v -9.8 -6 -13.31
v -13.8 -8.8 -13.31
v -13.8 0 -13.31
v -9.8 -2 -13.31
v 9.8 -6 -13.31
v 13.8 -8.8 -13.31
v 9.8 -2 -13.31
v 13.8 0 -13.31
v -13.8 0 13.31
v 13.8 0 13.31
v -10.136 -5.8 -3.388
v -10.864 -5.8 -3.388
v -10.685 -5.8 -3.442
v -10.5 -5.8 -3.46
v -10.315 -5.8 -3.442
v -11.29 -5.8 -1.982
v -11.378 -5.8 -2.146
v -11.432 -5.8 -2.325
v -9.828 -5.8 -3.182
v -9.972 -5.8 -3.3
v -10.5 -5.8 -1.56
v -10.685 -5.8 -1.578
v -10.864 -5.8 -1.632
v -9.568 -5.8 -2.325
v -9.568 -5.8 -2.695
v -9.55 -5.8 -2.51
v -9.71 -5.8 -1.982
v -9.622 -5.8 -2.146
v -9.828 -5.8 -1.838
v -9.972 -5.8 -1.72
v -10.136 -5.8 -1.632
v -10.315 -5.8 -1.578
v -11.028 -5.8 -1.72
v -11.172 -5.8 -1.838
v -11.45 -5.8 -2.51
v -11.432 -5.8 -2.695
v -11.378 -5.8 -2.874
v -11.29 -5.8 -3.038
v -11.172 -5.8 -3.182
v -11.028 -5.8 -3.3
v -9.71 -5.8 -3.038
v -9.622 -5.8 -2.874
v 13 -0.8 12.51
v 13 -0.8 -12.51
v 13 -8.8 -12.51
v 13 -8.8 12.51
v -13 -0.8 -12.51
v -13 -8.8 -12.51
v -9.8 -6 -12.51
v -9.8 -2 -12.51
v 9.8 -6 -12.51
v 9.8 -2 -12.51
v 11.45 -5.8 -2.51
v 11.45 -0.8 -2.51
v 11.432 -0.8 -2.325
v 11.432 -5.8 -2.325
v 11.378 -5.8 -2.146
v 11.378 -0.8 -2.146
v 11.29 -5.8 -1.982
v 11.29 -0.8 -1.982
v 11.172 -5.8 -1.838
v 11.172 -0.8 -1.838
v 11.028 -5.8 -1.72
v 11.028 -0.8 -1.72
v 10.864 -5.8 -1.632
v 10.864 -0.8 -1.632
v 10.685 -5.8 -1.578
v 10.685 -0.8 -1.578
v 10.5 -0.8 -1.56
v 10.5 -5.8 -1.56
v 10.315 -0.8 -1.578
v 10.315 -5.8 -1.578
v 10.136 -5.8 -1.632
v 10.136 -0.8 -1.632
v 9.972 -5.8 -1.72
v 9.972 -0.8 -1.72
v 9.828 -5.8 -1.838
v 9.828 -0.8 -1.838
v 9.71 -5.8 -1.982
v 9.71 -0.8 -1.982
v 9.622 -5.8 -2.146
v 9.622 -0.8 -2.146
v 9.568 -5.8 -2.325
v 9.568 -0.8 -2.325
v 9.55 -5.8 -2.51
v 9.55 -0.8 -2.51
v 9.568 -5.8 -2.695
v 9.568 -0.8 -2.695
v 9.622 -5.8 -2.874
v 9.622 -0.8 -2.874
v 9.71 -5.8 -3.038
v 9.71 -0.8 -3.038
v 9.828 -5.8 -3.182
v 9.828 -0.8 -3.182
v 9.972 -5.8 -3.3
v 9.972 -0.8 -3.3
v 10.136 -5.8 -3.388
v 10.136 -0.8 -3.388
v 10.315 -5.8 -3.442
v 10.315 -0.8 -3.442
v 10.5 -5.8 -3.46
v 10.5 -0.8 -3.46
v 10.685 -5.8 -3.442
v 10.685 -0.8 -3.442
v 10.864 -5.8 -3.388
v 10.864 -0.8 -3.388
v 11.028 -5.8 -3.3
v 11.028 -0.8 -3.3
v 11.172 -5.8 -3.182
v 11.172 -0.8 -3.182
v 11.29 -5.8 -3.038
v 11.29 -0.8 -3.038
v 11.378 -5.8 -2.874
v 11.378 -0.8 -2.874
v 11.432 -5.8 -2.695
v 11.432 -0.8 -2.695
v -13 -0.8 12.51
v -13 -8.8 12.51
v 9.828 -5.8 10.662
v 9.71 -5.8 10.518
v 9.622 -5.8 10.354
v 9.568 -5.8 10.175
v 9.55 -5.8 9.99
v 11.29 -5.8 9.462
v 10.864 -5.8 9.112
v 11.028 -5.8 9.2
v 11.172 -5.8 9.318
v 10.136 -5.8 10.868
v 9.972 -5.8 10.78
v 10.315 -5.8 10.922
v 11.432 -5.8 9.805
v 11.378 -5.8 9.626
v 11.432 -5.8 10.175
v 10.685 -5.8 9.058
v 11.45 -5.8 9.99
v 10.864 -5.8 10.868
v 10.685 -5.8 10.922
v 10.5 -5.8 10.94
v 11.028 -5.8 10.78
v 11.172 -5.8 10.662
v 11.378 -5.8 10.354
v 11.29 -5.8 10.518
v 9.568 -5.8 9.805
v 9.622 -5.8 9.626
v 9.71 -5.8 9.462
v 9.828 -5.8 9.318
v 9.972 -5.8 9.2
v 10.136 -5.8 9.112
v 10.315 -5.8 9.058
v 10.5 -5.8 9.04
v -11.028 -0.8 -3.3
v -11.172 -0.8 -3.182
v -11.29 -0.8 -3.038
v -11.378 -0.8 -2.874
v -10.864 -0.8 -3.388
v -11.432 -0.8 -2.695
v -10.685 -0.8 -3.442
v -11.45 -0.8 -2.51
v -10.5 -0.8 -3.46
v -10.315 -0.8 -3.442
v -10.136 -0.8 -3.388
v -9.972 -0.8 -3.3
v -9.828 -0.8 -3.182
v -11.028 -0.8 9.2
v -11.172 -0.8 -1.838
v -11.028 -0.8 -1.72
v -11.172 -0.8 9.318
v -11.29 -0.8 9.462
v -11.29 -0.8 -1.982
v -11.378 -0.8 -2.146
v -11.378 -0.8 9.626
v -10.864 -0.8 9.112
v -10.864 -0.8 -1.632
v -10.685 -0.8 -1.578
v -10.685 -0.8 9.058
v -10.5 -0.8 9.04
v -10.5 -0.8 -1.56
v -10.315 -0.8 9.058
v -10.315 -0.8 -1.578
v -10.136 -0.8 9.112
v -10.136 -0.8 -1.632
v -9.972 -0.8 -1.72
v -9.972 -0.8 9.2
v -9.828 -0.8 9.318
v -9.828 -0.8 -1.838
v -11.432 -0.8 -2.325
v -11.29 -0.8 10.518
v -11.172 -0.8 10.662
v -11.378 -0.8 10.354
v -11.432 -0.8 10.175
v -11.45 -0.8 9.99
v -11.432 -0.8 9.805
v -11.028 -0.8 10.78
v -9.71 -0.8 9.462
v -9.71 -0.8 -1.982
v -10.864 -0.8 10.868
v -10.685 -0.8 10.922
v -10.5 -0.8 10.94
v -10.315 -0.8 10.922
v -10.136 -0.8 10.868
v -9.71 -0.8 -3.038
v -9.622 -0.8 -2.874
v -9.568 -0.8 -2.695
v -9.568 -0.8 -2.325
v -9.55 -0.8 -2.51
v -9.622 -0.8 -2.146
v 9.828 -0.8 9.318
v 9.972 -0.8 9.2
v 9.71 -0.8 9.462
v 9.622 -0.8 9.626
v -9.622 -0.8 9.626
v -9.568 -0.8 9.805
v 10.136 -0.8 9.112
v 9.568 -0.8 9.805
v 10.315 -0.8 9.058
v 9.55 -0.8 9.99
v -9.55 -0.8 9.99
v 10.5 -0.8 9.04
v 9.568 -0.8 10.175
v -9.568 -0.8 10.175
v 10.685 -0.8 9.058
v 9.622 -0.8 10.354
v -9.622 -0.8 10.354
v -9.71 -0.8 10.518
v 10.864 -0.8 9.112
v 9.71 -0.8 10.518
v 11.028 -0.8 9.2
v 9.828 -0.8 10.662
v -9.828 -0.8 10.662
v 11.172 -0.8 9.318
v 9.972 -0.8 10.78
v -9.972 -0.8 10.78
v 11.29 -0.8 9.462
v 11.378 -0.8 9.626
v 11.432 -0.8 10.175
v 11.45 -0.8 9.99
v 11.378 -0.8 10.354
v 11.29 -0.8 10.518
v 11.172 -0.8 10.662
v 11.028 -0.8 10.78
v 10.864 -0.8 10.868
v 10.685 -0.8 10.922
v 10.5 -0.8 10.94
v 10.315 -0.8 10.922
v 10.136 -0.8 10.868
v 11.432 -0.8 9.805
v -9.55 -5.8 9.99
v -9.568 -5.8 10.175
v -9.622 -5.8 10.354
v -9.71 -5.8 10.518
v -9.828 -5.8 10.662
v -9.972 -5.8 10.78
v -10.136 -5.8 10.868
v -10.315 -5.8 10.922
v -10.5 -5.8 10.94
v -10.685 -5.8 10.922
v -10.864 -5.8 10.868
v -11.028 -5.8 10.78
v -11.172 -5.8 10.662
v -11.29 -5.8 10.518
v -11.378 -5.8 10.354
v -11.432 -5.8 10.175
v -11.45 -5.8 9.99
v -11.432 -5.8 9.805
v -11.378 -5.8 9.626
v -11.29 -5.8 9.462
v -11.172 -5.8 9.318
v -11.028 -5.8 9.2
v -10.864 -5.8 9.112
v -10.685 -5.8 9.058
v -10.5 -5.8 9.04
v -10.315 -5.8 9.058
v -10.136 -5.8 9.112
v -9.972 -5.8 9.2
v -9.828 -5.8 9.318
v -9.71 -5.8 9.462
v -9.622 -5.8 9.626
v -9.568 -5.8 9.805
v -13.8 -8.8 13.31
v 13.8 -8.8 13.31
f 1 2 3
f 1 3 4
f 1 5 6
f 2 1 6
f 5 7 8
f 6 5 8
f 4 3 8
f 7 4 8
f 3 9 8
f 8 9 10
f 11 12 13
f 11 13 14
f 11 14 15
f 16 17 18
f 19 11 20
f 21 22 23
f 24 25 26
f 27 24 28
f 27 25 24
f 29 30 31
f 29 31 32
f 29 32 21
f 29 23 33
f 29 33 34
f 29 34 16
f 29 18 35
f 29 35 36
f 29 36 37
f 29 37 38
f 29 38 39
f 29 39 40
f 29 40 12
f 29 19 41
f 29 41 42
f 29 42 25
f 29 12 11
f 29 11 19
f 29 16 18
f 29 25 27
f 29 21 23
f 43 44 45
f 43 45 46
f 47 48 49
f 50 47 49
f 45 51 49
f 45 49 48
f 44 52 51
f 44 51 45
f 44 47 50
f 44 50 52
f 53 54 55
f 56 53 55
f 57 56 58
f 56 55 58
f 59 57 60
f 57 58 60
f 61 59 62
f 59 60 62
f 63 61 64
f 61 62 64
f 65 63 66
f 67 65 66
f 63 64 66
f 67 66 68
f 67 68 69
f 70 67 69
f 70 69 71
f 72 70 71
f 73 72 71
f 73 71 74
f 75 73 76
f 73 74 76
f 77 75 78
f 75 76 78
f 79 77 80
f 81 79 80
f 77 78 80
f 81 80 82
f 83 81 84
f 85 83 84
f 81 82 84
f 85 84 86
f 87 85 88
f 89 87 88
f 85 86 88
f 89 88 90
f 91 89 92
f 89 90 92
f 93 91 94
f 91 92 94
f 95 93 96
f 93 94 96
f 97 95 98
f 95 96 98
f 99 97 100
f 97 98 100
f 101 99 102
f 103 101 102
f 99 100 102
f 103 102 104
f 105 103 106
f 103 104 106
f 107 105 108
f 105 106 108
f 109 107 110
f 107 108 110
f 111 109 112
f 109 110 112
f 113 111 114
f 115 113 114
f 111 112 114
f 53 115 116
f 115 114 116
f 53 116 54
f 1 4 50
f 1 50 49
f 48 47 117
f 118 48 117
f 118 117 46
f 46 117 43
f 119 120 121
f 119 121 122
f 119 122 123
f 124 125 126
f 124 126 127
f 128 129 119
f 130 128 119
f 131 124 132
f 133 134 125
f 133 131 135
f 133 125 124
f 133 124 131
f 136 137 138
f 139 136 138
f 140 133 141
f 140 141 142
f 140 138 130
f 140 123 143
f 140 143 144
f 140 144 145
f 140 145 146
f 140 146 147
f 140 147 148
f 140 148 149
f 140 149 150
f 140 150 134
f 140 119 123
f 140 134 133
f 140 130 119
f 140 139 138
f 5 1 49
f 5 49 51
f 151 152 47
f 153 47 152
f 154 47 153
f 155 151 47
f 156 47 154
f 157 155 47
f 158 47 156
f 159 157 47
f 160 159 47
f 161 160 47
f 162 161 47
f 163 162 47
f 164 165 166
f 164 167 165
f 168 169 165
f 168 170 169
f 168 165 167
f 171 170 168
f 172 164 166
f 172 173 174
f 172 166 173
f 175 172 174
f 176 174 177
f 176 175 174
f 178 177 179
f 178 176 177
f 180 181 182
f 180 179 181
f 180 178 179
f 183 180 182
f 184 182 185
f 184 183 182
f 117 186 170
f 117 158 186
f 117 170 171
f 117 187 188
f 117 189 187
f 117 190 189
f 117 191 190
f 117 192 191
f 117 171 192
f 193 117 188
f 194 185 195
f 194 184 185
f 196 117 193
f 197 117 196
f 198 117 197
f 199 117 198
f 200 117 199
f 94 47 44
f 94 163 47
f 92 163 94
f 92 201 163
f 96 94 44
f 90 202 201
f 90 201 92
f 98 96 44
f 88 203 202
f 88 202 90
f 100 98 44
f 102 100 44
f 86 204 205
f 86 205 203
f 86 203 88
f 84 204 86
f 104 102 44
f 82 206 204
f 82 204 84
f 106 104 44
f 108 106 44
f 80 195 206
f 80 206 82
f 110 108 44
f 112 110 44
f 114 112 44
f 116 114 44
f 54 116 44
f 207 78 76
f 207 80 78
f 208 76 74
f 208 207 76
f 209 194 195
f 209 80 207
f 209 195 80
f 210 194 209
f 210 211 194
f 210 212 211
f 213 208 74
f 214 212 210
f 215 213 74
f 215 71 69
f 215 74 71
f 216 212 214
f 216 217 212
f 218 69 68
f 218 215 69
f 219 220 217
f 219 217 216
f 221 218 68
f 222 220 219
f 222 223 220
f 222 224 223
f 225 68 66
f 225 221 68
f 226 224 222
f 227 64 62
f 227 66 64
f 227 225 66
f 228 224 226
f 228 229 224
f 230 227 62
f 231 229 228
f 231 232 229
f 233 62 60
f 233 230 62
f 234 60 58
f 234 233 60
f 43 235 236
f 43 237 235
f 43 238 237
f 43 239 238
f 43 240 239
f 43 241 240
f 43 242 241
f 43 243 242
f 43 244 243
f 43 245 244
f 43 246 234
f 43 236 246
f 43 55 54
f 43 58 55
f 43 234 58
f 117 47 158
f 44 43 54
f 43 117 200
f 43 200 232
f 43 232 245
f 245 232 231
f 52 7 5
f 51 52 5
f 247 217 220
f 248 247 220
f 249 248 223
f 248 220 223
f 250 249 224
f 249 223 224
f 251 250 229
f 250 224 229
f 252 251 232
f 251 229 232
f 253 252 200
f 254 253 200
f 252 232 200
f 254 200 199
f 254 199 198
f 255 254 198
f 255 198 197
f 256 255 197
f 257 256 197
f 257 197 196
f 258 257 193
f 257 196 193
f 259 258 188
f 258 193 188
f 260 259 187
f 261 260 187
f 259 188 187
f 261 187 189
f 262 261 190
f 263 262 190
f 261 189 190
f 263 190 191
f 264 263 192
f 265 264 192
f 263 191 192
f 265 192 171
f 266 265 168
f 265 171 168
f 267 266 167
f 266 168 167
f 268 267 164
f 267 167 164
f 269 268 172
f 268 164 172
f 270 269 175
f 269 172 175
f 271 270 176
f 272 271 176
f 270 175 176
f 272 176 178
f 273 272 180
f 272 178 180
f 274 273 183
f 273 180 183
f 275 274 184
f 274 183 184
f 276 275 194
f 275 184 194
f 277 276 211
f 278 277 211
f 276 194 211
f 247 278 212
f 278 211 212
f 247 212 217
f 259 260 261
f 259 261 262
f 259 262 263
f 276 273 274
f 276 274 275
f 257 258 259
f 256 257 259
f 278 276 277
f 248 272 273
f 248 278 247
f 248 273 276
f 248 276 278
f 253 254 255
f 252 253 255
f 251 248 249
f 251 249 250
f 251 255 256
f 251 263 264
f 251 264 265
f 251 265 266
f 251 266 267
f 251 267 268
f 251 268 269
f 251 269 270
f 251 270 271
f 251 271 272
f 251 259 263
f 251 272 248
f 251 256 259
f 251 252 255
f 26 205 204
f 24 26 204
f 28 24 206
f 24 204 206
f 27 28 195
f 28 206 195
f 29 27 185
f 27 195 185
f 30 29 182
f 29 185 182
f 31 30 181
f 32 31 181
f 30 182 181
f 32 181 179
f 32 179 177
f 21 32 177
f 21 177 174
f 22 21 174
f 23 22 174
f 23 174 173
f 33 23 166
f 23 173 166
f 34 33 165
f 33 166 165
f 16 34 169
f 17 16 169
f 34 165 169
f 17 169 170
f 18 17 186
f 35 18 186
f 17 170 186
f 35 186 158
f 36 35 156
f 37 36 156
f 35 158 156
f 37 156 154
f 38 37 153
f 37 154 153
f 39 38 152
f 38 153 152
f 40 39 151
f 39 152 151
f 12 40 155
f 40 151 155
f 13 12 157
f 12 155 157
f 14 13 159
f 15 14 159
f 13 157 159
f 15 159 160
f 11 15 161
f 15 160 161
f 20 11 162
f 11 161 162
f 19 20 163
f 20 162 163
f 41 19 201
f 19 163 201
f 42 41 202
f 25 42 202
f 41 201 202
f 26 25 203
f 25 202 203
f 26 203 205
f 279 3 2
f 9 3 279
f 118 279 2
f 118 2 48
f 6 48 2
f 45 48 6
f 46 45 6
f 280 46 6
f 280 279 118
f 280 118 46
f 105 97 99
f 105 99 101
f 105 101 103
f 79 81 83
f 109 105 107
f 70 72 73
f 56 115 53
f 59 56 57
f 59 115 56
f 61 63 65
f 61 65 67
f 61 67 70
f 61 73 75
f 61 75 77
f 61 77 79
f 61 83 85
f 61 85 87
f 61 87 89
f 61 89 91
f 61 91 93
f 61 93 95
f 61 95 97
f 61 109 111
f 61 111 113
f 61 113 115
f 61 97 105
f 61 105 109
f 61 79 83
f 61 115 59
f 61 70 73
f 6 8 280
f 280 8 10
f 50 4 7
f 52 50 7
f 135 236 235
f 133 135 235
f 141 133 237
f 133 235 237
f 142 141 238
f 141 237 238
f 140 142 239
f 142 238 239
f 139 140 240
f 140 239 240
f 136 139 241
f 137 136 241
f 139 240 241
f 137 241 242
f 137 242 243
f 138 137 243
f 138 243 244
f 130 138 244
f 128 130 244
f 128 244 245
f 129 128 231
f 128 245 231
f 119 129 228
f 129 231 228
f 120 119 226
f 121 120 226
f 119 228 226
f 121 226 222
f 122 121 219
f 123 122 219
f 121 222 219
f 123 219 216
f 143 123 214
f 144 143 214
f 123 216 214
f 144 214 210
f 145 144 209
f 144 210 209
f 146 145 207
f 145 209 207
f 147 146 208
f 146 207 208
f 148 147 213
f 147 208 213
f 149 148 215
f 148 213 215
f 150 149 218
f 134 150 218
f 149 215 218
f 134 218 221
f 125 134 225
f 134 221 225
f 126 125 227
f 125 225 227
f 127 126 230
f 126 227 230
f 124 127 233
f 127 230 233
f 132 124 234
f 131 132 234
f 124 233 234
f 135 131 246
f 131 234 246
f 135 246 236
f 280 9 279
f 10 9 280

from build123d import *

# Parameters (mm, degrees)
F0_W     = 27.6
F0_H     = 26.62
F1_DEPTH = 0.8
F2_W     = 27.6
F2_H     = 26.62
F2_W_2   = 26
F2_H_2   = 25.02
F3_DEPTH = 8
F4_R     = 0.95
F5_DEPTH = 5
F6_W     = 19.6
F6_H     = 4
F7_DEPTH = 1.7


with BuildPart() as f1:
    # F0 (on Front) → F1 (new body)
    with BuildSketch(Plane.XZ):
        Rectangle(F0_W, F0_H)
    extrude(amount=F1_DEPTH)

    # F2 (on face) → F3 (join)
    with BuildSketch(Plane.XZ.offset(0.8)):
        Rectangle(F2_W, F2_H)
        Rectangle(F2_W_2, F2_H_2, mode=Mode.SUBTRACT)
    extrude(amount=F3_DEPTH)

    # F4 (on face) → F5 (join)
    with BuildSketch(Plane.XZ.offset(0.8)):
        with Locations((-10.5, 9.99)):
            Circle(F4_R)
        with Locations((-10.5, -2.51)):
            Circle(F4_R)
        with Locations((10.5, 9.99)):
            Circle(F4_R)
        with Locations((10.5, -2.51)):
            Circle(F4_R)
    extrude(amount=F5_DEPTH)

    # F6 (on face) → F7 (cut)
    with BuildSketch(Plane(origin=(0, 0, -13.31), x_dir=(1, 0, 0), z_dir=(0, 0, -1))):
        with Locations((0, 4)):
            Rectangle(F6_W, F6_H)
    extrude(amount=-F7_DEPTH, mode=Mode.SUBTRACT)


solid = f1.part
